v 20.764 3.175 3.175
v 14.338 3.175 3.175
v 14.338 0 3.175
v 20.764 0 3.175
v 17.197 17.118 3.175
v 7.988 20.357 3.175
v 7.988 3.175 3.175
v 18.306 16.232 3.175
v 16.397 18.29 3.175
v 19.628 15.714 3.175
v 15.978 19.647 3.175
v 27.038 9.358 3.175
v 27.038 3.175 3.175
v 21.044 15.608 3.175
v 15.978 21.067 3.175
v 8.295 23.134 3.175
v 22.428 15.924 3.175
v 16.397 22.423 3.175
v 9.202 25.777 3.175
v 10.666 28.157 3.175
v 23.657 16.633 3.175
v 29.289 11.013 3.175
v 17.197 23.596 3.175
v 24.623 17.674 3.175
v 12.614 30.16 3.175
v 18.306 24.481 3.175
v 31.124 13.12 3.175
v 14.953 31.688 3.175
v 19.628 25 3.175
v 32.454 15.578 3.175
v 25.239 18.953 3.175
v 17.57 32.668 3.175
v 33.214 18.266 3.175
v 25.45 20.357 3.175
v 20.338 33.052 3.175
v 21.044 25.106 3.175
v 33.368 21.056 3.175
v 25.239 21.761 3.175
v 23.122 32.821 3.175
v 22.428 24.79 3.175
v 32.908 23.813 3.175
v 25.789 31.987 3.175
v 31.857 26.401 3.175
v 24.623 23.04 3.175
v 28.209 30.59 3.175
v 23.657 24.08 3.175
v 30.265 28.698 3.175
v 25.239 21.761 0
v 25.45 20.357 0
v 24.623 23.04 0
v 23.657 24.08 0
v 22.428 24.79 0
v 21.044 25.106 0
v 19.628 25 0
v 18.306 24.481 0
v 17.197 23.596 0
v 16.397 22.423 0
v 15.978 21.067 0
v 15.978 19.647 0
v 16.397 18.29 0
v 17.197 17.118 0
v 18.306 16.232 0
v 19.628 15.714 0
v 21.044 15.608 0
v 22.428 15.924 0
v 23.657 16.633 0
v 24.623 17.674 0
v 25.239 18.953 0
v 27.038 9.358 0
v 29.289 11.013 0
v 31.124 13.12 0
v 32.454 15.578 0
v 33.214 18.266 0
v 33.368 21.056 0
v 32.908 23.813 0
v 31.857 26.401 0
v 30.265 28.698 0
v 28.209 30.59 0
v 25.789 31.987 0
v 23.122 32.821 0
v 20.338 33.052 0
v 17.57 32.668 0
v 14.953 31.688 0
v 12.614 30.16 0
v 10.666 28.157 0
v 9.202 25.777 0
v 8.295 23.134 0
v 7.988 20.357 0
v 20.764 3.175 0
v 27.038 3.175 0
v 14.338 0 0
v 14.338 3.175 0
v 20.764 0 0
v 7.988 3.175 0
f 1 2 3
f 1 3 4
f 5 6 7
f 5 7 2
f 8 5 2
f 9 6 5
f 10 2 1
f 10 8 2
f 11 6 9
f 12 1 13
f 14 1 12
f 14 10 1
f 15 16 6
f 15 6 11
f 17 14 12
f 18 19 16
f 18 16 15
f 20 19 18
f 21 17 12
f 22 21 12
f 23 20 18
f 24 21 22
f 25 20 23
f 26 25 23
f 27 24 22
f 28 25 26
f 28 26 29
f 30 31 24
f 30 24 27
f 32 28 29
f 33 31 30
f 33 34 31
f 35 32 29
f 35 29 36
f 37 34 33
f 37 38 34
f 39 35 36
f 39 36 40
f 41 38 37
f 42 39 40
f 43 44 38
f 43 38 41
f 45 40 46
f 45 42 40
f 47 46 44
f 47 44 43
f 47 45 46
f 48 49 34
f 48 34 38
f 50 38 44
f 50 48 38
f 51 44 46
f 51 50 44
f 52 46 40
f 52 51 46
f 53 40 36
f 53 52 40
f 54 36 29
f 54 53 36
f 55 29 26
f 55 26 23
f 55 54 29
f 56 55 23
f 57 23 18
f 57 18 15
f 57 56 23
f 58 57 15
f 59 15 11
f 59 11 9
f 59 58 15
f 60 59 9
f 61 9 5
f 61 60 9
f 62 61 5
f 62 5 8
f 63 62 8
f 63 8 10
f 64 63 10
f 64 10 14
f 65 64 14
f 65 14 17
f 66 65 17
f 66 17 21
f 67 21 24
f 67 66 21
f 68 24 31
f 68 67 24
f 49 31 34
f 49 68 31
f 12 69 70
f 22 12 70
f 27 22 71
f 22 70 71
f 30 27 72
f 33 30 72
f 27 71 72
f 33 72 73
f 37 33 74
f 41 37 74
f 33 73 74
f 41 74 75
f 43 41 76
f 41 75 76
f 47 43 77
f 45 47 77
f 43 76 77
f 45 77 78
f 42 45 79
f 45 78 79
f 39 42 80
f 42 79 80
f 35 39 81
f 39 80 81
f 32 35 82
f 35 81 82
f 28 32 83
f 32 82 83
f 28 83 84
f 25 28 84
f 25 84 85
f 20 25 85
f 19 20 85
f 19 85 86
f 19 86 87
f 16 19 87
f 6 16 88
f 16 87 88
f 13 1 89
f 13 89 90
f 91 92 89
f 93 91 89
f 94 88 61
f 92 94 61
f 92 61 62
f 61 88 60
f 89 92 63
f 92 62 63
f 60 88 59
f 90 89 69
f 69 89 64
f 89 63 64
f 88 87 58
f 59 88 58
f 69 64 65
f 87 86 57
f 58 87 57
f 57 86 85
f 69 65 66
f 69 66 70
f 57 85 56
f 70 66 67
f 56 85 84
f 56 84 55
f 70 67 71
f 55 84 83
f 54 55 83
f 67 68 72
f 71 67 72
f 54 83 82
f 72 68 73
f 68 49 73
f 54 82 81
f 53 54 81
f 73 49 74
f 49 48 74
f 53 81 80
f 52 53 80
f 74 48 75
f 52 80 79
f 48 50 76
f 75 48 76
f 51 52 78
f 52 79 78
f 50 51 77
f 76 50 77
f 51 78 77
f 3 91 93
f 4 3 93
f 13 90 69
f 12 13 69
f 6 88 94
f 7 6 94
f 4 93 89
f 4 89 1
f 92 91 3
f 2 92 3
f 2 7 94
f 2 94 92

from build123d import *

# Parameters (mm, degrees)
SKETCH1_R           = 4.7625
BOSS_EXTRUDE1_DEPTH = 3.175
SKETCH2_W           = 6.35
SKETCH2_H           = 3.175
SKETCH2_W_2         = 6.2738
CUT_EXTRUDE1_DEPTH  = 3.175


with BuildPart() as part:
    # Sketch1 → Boss-Extrude1 (new body)
    with BuildSketch(Plane.XY):
        with BuildLine():
            Line((7.987675642, 20.35683), (7.987675642, 0))
            Line((7.987675642, 0), (27.037675642, 0))
            Line((27.037675642, 0), (27.037675642, 9.358307372))
            ThreePointArc((27.037675642, 9.358307372), (27.037675642, 31.355352628), (7.987675642, 20.35683))
        make_face()
        with Locations((20.687675642, 20.35683)):
            Circle(SKETCH1_R, mode=Mode.SUBTRACT)
    extrude(amount=BOSS_EXTRUDE1_DEPTH)

    # Sketch2 → Cut-Extrude1 (cut)
    with BuildSketch(Plane.XZ):
        with Locations((11.162675642, 1.5875)):
            Rectangle(SKETCH2_W, SKETCH2_H)
        with Locations((23.900775642, 1.5875)):
            Rectangle(SKETCH2_W_2, SKETCH2_H)
    extrude(amount=-CUT_EXTRUDE1_DEPTH, mode=Mode.SUBTRACT)


solid = part.part
